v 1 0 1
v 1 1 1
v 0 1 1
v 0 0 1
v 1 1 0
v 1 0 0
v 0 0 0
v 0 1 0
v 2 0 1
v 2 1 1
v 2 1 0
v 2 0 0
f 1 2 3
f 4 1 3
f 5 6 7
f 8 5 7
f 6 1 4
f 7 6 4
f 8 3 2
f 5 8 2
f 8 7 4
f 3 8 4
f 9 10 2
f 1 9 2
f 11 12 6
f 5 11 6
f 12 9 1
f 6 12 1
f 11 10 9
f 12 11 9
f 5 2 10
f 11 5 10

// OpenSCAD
//
// Attempt at gluing together two open-face cubes with a small gap.
// This should be fixable by PolySetBuilder
//

e=1e-10;

polyhedron(
  points=[
    [0, 0, 0],
    [1-e, 0, 0],
    [0, 1, 0],
    [1-e, 1, 0],
    [0, 0, 1],
    [1-e, 0, 1],
    [0, 1, 1],
    [1-e, 1, 1],

    [1+e, 0, 0],
    [2, 0, 0],
    [1+e, 1, 0],
    [2, 1, 0],
    [1+e, 0, 1],
    [2, 0, 1],
    [1+e, 1, 1],
    [2, 1, 1],
  ],
  faces=[
    [6,7,5],[6,5,4],
    [0,1,3],[0,3,2],
    [4,5,1],[4,1,0],
    [7,6,2],[7,2,3],
    [4,0,2],[4,2,6],
    [14,15,13],[14,13,12],
    [8,9,11],[8,11,10],
    [12,13,9],[12,9,8],
    [13,15,11],[13,11,9],
    [15,14,10],[15,10,11],
  ]);
